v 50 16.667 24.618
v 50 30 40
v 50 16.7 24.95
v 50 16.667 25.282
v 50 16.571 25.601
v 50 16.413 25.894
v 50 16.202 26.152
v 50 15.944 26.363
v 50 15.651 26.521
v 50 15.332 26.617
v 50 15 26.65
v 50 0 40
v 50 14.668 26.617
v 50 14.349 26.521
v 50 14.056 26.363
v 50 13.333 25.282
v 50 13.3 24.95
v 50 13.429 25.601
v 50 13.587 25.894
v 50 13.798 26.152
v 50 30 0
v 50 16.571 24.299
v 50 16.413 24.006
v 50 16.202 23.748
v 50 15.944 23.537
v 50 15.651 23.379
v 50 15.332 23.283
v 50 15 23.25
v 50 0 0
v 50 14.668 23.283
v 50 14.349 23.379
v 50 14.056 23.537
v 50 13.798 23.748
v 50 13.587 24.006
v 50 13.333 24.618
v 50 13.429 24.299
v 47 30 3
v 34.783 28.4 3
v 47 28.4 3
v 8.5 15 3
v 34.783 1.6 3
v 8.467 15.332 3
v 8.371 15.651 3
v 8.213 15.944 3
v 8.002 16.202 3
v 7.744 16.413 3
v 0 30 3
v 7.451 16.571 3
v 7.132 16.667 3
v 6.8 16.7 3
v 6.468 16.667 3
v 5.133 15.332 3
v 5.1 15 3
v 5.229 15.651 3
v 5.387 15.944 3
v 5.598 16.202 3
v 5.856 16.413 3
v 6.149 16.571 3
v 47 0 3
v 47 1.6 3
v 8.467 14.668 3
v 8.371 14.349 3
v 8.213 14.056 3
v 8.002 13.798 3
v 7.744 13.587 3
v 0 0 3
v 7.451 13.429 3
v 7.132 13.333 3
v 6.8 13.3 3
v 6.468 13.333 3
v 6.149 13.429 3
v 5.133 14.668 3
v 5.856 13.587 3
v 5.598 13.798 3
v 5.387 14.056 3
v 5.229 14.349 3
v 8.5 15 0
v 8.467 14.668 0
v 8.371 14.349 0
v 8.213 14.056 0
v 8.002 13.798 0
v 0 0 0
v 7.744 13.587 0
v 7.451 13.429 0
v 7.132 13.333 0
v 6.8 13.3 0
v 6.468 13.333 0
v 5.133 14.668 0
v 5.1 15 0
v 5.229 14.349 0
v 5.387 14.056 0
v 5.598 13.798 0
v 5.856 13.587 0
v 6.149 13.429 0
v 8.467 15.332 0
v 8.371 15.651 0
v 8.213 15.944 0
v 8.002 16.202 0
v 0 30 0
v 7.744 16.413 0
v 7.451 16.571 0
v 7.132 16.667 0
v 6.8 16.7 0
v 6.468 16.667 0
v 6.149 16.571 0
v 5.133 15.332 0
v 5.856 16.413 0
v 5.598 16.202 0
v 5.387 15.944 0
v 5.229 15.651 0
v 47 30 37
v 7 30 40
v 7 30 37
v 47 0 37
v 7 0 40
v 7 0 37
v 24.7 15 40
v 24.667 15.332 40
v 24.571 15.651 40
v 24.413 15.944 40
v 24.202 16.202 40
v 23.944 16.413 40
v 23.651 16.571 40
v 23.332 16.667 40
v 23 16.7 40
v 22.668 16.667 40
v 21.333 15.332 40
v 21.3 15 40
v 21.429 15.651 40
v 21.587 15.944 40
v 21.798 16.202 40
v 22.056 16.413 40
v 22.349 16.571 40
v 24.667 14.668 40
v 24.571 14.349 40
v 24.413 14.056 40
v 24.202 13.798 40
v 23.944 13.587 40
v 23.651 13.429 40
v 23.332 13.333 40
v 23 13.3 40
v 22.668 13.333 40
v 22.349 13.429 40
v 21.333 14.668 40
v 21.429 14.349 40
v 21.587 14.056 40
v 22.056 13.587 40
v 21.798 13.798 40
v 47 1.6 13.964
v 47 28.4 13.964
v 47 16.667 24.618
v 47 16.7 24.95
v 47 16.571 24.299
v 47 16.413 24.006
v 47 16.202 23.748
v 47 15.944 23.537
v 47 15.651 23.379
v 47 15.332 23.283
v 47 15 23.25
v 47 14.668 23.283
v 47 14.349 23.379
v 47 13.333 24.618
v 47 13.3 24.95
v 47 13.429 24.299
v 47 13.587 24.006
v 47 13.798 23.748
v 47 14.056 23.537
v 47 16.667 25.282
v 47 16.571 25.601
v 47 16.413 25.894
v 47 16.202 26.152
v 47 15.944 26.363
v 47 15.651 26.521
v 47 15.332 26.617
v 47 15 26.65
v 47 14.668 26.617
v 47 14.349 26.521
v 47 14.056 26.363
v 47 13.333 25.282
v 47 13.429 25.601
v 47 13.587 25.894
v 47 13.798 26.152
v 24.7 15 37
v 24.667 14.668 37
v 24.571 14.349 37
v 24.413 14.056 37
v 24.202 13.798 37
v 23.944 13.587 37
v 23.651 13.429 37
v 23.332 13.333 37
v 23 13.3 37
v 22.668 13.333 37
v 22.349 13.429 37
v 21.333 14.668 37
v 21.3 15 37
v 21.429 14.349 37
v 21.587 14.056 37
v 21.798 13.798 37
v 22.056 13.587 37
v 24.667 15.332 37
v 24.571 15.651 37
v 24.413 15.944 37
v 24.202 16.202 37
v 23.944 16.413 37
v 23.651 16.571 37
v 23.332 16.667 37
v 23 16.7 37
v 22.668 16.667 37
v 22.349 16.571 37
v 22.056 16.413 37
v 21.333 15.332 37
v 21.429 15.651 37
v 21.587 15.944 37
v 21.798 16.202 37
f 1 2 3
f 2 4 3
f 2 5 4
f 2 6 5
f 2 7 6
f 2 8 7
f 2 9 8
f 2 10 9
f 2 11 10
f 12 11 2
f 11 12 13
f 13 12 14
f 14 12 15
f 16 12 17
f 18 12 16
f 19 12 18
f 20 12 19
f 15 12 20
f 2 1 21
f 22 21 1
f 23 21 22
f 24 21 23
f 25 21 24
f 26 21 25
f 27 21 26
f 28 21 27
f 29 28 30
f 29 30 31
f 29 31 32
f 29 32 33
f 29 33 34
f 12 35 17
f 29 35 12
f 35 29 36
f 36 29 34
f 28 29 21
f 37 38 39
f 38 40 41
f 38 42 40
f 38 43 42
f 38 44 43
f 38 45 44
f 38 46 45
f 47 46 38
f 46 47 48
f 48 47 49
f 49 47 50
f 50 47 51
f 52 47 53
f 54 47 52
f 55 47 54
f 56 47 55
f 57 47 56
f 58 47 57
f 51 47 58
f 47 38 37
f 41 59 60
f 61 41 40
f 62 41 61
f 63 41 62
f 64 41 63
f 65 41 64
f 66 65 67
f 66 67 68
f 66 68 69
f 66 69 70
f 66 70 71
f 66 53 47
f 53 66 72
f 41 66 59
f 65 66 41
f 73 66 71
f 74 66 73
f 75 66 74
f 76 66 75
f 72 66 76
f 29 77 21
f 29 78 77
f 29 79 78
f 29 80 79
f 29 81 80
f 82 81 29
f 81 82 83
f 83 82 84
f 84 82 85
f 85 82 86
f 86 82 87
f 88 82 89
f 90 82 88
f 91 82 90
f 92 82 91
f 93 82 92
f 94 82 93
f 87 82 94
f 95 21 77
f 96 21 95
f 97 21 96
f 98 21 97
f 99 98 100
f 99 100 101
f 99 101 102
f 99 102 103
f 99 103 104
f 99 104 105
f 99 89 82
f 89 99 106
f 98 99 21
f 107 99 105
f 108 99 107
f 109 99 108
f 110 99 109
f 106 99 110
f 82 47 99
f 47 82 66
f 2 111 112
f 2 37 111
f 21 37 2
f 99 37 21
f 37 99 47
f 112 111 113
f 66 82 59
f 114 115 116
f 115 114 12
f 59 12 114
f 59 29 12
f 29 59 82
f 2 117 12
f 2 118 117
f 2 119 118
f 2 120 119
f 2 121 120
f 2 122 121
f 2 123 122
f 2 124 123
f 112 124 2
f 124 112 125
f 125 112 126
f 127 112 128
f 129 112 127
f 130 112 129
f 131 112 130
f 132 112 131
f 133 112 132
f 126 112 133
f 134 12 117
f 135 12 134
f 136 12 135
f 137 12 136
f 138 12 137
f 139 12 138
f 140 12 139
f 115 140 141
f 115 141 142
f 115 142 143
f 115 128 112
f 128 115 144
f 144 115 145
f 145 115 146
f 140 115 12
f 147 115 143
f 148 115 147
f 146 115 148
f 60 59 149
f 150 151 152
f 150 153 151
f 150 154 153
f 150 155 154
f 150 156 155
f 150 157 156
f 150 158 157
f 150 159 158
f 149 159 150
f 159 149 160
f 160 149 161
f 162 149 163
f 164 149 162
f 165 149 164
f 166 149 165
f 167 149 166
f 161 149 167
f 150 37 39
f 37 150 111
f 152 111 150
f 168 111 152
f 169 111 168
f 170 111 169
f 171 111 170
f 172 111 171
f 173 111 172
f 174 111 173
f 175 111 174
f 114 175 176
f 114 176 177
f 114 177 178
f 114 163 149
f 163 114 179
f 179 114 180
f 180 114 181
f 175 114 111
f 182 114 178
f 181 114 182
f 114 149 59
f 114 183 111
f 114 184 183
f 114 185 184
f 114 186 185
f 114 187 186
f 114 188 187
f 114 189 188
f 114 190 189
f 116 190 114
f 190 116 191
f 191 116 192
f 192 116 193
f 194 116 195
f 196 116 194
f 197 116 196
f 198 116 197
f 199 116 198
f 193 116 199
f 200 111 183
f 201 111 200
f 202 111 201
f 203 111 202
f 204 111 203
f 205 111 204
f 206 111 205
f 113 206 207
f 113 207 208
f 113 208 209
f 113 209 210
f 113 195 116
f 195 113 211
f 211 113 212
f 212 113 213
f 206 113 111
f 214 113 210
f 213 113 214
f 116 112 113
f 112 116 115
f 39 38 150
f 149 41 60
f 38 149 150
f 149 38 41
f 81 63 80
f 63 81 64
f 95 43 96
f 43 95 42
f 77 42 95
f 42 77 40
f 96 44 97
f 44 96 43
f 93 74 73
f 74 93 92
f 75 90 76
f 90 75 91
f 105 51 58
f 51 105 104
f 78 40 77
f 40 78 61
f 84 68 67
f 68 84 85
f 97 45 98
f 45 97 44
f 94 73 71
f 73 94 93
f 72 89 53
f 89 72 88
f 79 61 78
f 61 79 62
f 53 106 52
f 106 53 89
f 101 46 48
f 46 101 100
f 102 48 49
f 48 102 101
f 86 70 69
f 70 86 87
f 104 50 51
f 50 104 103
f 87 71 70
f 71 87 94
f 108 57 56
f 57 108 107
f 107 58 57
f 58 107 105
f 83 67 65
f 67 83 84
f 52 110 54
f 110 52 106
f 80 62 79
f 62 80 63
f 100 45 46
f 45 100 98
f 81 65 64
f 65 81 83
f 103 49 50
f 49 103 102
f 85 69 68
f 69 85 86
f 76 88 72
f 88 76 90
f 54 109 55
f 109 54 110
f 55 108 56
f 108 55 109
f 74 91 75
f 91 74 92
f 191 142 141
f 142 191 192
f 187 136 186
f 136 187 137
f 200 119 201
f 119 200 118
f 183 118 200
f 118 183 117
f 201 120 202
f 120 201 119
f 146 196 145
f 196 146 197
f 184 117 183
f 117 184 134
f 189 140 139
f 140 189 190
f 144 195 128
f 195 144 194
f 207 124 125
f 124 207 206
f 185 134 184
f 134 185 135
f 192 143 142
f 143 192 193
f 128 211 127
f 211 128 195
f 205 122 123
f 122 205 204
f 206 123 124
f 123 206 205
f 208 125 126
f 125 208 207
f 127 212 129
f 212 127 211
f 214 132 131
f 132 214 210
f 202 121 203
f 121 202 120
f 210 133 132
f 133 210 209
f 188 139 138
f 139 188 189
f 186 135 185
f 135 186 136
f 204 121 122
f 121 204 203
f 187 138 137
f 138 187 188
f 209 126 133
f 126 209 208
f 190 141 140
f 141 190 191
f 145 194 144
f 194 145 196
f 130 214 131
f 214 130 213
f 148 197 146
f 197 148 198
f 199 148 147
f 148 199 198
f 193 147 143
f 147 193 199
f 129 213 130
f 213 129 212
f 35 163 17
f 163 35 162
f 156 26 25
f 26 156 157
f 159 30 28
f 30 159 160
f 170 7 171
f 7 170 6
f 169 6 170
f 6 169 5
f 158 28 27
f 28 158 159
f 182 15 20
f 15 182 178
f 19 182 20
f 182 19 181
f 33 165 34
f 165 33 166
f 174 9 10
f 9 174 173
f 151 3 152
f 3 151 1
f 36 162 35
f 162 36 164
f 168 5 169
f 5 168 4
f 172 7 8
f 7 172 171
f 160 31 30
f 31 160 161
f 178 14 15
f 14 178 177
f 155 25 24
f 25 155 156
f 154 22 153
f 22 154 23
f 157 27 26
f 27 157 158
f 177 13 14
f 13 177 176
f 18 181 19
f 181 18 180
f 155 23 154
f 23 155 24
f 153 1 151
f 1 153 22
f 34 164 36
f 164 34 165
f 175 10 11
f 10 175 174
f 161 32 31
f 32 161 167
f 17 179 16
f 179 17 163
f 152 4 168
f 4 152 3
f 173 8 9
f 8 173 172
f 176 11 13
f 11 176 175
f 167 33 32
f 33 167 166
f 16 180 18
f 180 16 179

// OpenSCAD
$fn = 32;

// ----------------------------------------------------------------------
// Z-bracket: 50 x 30 x 40 mm
// ----------------------------------------------------------------------

// --- parameters (mm) ---
bottom_run = 50;          // lower foot length, X
top_run = 40;             // upper foot length, X
profile_w = 30;           // bracket width, Y
height = 40;              // overall rise, Z
mat_t = 3;                // plate thickness
hole_d = 3.4;             // clearance for M3
rib_len = 14;             // gusset leg
rib_sink = 1.6;           // gusset overlap into the plates

module hole_z(px, py, z0) {
  translate([px, py, z0 - 2.5]) cylinder(h = mat_t + 5, d = hole_d);
}
module hole_x(py, pz) {
  translate([-2.5, py, pz]) rotate([0, 90, 0]) cylinder(h = mat_t + 5, d = hole_d);
}
module gusset(x0) {
  translate([x0, profile_w - rib_sink, 0])
    rotate([90, 0, 0])
      linear_extrude(height = profile_w - 2 * rib_sink)
        polygon(points = [[rib_sink, mat_t - rib_sink],
                          [rib_sink, mat_t - rib_sink + rib_len],
                          [-rib_len, mat_t - rib_sink]]);
}

difference() {
  union() {
    cube([bottom_run, profile_w, mat_t]);
    /* web, overlapping the lower foot */
    translate([bottom_run - mat_t, 0, 0]) cube([mat_t, profile_w, height]);
    /* upper foot, sunk into the web */
    translate([bottom_run - mat_t - top_run, 0, height - mat_t]) cube([top_run + mat_t, profile_w, mat_t]);
    gusset(bottom_run - mat_t);
  }
  hole_z(6.8, 15, 0);
  translate([bottom_run - mat_t - 24, 0, 0]) hole_z(0, 15, height - mat_t);
  translate([bottom_run - mat_t, 0, 0]) hole_x(15, 24.95);
}
